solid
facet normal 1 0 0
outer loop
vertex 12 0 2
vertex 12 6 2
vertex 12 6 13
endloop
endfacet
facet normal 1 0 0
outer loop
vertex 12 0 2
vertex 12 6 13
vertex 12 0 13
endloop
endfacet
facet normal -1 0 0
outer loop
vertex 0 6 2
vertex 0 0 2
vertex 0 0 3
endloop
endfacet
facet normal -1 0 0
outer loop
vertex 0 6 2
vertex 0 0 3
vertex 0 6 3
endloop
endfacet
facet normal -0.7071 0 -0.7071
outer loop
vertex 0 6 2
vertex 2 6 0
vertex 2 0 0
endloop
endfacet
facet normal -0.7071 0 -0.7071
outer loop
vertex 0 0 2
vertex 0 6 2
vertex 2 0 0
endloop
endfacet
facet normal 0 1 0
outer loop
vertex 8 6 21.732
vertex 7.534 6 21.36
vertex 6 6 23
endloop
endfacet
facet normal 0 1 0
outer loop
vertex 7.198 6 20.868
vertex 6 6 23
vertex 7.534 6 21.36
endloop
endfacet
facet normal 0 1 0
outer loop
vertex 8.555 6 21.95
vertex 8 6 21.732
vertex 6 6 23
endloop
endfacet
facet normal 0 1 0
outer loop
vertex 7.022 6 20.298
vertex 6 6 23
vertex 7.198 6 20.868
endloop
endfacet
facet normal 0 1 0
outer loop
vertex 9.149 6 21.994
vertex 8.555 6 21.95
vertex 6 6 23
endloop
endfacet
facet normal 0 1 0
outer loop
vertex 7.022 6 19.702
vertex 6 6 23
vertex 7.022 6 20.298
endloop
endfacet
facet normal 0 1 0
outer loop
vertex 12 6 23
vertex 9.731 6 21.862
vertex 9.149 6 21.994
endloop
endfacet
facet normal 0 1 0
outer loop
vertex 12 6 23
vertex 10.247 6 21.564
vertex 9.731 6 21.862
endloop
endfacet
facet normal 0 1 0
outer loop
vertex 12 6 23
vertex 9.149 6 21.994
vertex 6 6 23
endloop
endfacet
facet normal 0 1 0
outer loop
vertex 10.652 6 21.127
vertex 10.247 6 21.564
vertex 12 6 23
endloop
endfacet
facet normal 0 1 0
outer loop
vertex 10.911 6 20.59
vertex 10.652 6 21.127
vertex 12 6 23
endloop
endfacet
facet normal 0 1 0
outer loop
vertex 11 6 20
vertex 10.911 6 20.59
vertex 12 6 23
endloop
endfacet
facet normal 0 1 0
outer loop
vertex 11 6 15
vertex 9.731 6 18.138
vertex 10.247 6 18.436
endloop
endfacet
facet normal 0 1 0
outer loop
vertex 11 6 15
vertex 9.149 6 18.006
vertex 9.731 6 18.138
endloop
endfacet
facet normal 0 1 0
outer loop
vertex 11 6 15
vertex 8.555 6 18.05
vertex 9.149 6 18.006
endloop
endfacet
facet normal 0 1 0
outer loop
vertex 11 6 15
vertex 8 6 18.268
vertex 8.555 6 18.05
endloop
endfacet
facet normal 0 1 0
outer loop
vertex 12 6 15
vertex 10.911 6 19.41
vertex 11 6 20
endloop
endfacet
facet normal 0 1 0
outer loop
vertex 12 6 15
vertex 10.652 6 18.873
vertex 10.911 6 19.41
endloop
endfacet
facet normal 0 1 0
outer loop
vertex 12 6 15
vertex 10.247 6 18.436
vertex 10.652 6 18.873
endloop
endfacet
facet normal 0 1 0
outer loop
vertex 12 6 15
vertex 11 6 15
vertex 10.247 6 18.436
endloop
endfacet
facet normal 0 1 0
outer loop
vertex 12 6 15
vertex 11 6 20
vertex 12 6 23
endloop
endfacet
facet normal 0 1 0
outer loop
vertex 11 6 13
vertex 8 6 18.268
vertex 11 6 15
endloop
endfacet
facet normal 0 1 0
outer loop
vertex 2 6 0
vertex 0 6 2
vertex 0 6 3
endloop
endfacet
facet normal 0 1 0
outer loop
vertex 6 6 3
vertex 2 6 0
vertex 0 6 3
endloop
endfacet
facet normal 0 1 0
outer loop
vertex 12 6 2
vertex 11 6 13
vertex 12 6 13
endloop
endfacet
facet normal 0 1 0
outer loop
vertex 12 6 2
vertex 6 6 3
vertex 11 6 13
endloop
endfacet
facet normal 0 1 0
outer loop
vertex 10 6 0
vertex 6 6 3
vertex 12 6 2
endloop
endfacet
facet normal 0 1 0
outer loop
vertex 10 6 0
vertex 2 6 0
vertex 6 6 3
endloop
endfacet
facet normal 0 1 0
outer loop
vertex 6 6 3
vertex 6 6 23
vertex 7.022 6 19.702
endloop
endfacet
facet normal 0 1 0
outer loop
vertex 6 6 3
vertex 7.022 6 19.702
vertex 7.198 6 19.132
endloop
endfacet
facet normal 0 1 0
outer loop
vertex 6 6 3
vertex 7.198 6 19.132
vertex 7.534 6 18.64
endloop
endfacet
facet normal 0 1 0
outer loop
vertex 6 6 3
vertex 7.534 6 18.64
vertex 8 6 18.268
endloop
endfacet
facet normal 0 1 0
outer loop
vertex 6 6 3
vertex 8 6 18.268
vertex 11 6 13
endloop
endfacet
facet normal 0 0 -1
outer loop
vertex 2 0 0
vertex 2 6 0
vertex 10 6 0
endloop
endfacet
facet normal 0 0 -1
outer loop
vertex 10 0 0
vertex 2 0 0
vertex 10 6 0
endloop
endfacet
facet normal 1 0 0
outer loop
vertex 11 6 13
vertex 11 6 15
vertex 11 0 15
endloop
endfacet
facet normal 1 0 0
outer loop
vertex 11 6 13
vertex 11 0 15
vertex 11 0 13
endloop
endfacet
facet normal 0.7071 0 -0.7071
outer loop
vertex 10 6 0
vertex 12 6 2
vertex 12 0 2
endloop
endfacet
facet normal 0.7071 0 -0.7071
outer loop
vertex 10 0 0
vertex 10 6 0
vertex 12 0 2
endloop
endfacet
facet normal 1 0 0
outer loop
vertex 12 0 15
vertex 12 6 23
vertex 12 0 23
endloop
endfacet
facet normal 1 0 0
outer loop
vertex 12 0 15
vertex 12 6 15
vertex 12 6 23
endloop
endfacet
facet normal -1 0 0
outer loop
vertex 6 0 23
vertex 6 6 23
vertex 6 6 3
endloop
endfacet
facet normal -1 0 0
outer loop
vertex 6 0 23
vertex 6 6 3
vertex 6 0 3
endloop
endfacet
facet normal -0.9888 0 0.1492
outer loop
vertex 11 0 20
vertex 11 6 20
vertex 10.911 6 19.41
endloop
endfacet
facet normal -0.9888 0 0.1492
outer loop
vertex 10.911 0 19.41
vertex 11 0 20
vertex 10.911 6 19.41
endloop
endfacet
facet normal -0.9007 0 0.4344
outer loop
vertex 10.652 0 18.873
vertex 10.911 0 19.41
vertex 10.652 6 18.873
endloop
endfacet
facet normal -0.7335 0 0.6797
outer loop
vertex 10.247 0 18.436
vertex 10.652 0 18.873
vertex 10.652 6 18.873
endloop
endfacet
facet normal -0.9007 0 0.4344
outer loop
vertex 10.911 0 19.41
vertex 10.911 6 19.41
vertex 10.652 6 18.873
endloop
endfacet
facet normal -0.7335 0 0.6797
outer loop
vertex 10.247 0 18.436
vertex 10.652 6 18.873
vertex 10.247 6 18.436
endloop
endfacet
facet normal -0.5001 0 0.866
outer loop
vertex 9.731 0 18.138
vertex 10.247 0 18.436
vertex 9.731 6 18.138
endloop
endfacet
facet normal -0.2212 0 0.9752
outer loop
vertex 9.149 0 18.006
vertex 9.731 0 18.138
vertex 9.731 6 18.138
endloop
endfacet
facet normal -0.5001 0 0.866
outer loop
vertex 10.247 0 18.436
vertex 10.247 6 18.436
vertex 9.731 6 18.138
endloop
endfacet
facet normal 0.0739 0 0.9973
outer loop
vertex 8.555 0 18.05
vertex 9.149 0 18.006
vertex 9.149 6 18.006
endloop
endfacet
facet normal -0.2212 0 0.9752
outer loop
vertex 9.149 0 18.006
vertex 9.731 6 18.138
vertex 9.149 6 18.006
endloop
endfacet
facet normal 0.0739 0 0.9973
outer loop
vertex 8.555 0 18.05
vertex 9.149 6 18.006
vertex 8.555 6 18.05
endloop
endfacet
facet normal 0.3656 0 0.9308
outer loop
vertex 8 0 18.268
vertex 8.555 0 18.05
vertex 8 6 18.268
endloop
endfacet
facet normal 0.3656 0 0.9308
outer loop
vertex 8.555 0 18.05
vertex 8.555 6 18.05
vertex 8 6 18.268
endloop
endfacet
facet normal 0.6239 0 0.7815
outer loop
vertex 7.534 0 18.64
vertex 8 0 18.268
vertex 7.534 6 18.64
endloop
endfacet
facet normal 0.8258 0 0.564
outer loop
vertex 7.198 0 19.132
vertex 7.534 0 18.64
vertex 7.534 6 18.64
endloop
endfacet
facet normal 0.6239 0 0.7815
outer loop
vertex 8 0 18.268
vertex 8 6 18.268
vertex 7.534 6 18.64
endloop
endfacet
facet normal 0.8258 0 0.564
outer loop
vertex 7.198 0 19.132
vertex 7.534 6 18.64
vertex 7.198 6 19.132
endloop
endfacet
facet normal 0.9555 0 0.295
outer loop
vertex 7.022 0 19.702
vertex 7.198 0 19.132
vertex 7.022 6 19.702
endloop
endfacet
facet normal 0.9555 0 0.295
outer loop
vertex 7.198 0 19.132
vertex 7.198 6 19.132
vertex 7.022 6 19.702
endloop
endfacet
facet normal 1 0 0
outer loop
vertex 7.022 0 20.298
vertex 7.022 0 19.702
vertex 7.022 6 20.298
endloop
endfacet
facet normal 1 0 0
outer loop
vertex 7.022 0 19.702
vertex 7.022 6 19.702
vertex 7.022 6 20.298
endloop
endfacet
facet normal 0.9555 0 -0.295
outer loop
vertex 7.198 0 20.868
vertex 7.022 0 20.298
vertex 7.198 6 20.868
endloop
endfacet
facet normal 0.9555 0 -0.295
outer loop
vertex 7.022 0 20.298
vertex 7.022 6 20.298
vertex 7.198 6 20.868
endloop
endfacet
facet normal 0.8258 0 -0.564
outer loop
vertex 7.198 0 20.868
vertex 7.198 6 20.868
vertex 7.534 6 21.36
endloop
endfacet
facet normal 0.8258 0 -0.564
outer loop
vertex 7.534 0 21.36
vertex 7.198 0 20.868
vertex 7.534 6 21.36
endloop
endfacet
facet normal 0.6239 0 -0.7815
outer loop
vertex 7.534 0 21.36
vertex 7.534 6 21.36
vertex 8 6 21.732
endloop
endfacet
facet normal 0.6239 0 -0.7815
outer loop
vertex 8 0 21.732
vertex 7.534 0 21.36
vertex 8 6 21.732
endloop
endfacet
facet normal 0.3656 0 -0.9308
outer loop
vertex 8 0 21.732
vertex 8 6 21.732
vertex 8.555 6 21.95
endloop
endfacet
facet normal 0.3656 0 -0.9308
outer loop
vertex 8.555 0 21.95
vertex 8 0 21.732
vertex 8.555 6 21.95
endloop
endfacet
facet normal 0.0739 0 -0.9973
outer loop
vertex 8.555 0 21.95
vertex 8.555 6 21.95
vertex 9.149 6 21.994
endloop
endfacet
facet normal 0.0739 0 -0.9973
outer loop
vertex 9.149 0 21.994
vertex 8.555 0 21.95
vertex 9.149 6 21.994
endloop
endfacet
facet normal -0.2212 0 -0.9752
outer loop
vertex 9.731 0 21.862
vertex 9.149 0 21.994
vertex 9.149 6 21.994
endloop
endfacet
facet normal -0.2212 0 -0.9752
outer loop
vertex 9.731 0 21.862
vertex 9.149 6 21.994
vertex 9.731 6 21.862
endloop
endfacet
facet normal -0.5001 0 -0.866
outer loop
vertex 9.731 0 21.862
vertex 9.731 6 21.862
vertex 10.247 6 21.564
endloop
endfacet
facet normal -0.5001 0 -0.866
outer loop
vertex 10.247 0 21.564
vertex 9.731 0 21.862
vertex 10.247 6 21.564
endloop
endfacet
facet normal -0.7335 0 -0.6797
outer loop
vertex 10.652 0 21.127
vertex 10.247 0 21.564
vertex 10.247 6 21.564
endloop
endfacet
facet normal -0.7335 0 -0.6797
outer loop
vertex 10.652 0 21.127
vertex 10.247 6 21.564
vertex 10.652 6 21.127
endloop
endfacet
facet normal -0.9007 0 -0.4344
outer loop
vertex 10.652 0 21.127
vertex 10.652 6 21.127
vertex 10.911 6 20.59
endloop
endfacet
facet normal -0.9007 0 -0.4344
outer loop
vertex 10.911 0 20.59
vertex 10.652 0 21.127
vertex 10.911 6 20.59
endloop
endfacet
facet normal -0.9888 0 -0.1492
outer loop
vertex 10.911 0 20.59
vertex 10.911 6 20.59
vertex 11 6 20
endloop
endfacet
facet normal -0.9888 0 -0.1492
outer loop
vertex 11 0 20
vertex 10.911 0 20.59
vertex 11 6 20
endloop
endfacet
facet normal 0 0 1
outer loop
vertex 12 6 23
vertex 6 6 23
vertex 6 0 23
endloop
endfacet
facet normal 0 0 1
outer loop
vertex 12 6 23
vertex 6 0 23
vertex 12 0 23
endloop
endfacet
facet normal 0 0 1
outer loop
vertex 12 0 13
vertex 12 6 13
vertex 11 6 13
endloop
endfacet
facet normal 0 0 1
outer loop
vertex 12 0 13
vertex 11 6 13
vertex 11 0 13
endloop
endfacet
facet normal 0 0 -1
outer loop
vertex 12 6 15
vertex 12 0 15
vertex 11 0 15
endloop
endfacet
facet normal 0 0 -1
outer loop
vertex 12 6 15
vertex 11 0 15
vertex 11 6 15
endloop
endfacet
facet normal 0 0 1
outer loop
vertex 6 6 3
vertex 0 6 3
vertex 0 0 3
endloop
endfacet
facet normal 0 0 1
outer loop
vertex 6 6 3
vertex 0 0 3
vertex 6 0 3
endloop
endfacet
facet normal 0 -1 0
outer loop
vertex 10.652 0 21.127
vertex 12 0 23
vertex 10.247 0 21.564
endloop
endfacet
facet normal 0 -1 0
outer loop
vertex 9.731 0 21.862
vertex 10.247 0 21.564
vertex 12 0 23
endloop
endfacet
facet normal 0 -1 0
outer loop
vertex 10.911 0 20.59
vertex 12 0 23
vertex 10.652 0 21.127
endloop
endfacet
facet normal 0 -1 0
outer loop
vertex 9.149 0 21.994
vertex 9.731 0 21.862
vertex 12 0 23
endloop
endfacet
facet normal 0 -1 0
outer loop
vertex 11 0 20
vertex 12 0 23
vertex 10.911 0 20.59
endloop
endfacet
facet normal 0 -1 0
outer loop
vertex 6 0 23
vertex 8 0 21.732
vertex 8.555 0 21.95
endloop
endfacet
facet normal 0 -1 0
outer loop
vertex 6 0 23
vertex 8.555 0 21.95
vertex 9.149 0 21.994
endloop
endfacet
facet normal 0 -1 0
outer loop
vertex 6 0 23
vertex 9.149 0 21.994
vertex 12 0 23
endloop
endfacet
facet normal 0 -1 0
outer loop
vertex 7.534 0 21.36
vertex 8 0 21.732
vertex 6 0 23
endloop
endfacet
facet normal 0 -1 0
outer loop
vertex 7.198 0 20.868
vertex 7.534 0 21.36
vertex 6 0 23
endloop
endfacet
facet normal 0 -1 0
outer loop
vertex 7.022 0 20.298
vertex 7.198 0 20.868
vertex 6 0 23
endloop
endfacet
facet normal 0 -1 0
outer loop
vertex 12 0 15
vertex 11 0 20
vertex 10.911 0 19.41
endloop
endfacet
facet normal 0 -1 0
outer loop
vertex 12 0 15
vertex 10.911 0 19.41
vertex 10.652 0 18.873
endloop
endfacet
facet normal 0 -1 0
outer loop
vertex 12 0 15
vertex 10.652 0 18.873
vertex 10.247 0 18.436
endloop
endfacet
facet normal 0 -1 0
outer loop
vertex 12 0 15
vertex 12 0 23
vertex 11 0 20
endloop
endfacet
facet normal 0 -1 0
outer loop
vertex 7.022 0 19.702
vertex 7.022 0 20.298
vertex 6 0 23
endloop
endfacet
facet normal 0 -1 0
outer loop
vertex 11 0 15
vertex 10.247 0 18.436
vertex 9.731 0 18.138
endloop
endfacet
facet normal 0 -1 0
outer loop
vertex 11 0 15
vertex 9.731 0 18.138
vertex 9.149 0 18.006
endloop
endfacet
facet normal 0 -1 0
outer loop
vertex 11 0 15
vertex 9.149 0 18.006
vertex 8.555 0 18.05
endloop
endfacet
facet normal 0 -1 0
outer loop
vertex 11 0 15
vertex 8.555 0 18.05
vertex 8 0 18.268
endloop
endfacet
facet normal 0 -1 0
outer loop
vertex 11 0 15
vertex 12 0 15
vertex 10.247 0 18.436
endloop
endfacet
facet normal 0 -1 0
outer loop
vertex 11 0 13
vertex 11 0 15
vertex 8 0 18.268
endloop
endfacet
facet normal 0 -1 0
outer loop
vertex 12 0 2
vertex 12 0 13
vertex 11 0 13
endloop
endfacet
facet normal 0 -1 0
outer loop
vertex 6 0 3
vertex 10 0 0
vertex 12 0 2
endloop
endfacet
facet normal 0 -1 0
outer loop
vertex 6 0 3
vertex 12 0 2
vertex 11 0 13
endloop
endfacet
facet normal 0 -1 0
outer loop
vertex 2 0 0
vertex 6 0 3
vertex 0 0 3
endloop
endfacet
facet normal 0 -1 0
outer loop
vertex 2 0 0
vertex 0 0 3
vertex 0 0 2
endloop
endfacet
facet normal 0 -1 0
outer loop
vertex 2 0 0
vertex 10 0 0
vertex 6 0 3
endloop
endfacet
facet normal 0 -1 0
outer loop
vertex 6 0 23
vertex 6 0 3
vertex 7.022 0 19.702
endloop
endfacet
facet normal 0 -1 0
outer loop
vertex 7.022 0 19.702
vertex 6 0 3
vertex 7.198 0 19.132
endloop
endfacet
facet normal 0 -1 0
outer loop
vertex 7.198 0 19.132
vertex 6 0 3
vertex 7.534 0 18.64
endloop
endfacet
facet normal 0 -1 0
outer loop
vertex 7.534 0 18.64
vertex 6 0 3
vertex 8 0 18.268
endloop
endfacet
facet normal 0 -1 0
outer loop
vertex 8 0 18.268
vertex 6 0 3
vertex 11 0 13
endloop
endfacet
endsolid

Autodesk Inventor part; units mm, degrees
ref_plane "YZ Plane" through (0, 0, 0) normal (1, 0, 0) x (0, 1, 0)
ref_plane "XZ Plane" through (0, 0, 0) normal (0, 1, 0) x (-1, 0, 0)
ref_plane "XY Plane" through (0, 0, 0) normal (0, 0, 1) x (1, 0, 0)
sketch "Sketch1" plane through (0, 0, 0) normal (0, 0, 1) x (1, 0, 0)
  line L0 (0, 17) -> (12, 17)
  line L1 (12, 17) -> (12, 11)
  line L2 (12, 11) -> (0, 11)
  line L3 (0, 11) -> (0, 17)
  line L4 (0, 6) -> (12, 6)
  line L5 (12, 6) -> (12, 0)
  line L6 (12, 0) -> (0, 0)
  line L7 (0, 0) -> (0, 6)
  dimension "d0" = 6
  dimension "d1" = 5
  dimension "d2" = 12
extrude "Extrusion1" add sketch "Sketch1" along normal blind 3 contours L4 L5 L6 L7
sketch "Sketch2" plane through (0, 0, 3) normal (0, 0, 1) x (1, 0, 0)
  line L0 (16.7529, 15.7773) -> (28.7529, 15.7773) projected
  line L1 (28.7529, 22.7773) -> (22.7529, 22.7773)
  line L2 (22.7529, 22.7773) -> (22.7529, 15.7773)
  line L3 (22.7529, 15.7773) -> (28.7529, 15.7773)
  line L4 (28.7529, 15.7773) -> (28.7529, 22.7773)
  line L5 (28.7529, 22.7773) -> (16.7529, 22.7773) projected
  line L6 (28.7529, 15.7773) -> (28.7529, 22.7773) projected
  line L7 (12, 6) -> (6, 6)
  line L8 (6, 6) -> (6, 0)
  line L9 (6, 0) -> (12, 0)
  line L10 (12, 0) -> (12, 6)
  line L11 (0, 0) -> (12, 0) projected
  dimension "d5" = 6
extrude "Extrusion2" add sketch "Sketch2" along normal blind 20 contours L10 L9 L8 L7
sketch "Sketch3" plane through (0, 6, 0) normal (0, 1, 0) x (1, 0, 0)
  circle A0 centre (9, -20) radius 2
  line L0 (12, -23) -> (6, -23)
  line L1 (12, 0) -> (12, -23)
  point P0 (-16.7529, 0)
  dimension "d8" = 3
  dimension "d9" = 3
  dimension "d10" = 4
extrude "Extrusion3" cut sketch "Sketch3" against normal blind 30
chamfer "Chamfer1" distance 2 angle 45 2 edges at (12, 3, 0) (0, 3, 0)
sketch "Sketch4" plane through (12, 0, 23) normal (1, 0, 0) x (0, 0, -1)
  line L0 (8, 11.5882) -> (10, 11.5882)
  line L1 (10, 11.5882) -> (10, -21.6618)
  line L2 (10, -21.6618) -> (8, -21.6618)
  line L3 (8, -21.6618) -> (8, 11.5882)
  line L4 (0, 0) -> (0, 7)
  point P0 (23, -15.7773)
  dimension "d16" = 2
  dimension "d17" = 8
extrude "Extrusion4" cut sketch "Sketch4" against normal blind 1
properties part number "arms01"
